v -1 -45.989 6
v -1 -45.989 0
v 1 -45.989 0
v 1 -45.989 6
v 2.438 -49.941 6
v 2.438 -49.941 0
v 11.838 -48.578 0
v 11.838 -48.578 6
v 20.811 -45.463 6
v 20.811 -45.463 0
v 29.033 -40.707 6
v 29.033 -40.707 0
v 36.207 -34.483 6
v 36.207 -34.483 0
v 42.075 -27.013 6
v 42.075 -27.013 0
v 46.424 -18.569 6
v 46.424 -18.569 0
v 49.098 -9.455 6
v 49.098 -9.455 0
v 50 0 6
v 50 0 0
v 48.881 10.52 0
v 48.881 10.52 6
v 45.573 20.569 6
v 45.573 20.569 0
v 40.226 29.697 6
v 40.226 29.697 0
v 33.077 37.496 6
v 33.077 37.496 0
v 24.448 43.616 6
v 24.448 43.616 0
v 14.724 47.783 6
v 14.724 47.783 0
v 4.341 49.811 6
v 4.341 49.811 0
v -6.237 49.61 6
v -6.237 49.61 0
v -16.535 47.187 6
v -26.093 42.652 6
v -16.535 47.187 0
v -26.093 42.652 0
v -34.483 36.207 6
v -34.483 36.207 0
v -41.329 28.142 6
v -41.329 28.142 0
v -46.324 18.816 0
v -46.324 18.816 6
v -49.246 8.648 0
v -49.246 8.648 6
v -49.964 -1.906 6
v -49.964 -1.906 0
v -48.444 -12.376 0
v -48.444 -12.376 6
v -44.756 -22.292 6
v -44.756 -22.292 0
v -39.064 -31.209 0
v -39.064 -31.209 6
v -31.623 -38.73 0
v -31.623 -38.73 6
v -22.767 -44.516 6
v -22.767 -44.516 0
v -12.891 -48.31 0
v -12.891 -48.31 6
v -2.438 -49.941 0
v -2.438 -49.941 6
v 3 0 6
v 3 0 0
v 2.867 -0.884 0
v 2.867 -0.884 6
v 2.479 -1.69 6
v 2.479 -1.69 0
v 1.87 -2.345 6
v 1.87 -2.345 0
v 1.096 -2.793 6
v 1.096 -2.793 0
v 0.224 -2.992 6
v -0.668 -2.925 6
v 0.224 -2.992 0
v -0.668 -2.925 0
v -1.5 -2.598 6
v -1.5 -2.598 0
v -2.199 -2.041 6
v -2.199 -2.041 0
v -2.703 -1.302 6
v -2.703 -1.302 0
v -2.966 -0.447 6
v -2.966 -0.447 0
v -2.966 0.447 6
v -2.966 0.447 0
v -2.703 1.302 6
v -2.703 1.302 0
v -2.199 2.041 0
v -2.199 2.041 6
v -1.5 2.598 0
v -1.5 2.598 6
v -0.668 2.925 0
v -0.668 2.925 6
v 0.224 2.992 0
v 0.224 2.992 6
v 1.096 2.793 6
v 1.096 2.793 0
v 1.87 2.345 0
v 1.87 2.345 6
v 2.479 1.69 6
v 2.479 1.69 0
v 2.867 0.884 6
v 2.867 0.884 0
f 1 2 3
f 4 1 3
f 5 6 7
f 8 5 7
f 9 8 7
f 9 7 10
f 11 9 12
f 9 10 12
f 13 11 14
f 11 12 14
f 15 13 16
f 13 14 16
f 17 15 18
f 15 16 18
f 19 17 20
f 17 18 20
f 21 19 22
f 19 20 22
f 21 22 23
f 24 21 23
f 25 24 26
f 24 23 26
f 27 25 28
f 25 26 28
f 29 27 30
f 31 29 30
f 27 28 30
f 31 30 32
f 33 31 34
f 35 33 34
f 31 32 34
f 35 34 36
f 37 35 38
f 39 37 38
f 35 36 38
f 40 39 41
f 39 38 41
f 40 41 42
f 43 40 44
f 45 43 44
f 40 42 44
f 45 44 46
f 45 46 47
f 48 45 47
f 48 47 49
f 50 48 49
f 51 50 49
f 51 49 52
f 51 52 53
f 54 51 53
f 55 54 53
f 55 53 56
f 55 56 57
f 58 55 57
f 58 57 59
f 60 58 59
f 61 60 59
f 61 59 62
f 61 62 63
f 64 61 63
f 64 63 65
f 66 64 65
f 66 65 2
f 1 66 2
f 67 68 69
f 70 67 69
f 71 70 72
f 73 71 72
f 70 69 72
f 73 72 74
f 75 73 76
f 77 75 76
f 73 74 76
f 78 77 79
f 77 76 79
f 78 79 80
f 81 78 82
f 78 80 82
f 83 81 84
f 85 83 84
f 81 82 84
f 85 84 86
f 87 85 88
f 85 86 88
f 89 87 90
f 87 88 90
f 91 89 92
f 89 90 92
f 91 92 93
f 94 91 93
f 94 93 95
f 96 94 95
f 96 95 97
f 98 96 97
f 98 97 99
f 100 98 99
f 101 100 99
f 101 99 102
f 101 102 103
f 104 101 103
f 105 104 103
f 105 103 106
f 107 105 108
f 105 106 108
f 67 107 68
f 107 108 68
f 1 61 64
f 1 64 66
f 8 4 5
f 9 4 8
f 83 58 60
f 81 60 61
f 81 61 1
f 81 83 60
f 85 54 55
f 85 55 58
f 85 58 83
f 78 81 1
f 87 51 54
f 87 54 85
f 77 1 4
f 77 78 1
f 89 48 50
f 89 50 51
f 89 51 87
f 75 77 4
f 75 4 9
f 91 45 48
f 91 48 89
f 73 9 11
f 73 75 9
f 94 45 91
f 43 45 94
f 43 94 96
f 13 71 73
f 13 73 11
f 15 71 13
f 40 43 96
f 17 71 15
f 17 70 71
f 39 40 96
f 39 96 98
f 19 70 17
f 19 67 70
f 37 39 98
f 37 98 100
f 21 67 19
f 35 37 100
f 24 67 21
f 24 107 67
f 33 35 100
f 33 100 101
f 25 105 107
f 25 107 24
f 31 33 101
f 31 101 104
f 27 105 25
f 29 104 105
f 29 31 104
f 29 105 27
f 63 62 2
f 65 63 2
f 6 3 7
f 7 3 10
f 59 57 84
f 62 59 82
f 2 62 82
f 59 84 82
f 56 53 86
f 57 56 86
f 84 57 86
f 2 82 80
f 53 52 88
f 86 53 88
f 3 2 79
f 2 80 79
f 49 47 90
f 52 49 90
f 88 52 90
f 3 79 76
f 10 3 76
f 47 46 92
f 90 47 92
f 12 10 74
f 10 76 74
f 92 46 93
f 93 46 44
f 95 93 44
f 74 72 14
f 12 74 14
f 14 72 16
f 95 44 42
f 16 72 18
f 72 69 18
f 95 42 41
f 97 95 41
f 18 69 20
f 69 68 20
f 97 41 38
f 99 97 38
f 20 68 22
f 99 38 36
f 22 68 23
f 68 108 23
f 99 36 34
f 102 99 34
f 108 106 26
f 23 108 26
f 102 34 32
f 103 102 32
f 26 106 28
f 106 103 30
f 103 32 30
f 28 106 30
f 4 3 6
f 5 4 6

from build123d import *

# Parameters (mm, degrees)
F0_R     = 50
F1_DEPTH = 6
F2_R     = 3
F3_DEPTH = 6
F5_DEPTH = 6


with BuildPart() as f1:
    # F0 (on Top) → F1 (new body)
    with BuildSketch(Plane.XY):
        Circle(F0_R)
    extrude(amount=F1_DEPTH)

    # F2 (on face) → F3 (cut, through all)
    with BuildSketch(Plane(origin=(0, 0, 0), x_dir=(1, 0, 0), z_dir=(0, 0, -1))):
        Circle(F2_R)
    extrude(amount=-F3_DEPTH, mode=Mode.SUBTRACT)

    # F4 (on face) → F5 (cut, through all)
    with BuildSketch(Plane(origin=(0, 0, 0), x_dir=(1, 0, 0), z_dir=(0, 0, -1))):
        with BuildLine():
            Line((-1, 45.989129), (1, 45.989129))
            Line((1, 45.989129), (2.438188, 49.940517))
            ThreePointArc((2.438188, 49.940517), (0, 50.729887), (-2.438188, 49.940517))
            Line((-2.438188, 49.940517), (-1, 45.989129))
        make_face()
    extrude(amount=-F5_DEPTH, mode=Mode.SUBTRACT)


solid = f1.part
